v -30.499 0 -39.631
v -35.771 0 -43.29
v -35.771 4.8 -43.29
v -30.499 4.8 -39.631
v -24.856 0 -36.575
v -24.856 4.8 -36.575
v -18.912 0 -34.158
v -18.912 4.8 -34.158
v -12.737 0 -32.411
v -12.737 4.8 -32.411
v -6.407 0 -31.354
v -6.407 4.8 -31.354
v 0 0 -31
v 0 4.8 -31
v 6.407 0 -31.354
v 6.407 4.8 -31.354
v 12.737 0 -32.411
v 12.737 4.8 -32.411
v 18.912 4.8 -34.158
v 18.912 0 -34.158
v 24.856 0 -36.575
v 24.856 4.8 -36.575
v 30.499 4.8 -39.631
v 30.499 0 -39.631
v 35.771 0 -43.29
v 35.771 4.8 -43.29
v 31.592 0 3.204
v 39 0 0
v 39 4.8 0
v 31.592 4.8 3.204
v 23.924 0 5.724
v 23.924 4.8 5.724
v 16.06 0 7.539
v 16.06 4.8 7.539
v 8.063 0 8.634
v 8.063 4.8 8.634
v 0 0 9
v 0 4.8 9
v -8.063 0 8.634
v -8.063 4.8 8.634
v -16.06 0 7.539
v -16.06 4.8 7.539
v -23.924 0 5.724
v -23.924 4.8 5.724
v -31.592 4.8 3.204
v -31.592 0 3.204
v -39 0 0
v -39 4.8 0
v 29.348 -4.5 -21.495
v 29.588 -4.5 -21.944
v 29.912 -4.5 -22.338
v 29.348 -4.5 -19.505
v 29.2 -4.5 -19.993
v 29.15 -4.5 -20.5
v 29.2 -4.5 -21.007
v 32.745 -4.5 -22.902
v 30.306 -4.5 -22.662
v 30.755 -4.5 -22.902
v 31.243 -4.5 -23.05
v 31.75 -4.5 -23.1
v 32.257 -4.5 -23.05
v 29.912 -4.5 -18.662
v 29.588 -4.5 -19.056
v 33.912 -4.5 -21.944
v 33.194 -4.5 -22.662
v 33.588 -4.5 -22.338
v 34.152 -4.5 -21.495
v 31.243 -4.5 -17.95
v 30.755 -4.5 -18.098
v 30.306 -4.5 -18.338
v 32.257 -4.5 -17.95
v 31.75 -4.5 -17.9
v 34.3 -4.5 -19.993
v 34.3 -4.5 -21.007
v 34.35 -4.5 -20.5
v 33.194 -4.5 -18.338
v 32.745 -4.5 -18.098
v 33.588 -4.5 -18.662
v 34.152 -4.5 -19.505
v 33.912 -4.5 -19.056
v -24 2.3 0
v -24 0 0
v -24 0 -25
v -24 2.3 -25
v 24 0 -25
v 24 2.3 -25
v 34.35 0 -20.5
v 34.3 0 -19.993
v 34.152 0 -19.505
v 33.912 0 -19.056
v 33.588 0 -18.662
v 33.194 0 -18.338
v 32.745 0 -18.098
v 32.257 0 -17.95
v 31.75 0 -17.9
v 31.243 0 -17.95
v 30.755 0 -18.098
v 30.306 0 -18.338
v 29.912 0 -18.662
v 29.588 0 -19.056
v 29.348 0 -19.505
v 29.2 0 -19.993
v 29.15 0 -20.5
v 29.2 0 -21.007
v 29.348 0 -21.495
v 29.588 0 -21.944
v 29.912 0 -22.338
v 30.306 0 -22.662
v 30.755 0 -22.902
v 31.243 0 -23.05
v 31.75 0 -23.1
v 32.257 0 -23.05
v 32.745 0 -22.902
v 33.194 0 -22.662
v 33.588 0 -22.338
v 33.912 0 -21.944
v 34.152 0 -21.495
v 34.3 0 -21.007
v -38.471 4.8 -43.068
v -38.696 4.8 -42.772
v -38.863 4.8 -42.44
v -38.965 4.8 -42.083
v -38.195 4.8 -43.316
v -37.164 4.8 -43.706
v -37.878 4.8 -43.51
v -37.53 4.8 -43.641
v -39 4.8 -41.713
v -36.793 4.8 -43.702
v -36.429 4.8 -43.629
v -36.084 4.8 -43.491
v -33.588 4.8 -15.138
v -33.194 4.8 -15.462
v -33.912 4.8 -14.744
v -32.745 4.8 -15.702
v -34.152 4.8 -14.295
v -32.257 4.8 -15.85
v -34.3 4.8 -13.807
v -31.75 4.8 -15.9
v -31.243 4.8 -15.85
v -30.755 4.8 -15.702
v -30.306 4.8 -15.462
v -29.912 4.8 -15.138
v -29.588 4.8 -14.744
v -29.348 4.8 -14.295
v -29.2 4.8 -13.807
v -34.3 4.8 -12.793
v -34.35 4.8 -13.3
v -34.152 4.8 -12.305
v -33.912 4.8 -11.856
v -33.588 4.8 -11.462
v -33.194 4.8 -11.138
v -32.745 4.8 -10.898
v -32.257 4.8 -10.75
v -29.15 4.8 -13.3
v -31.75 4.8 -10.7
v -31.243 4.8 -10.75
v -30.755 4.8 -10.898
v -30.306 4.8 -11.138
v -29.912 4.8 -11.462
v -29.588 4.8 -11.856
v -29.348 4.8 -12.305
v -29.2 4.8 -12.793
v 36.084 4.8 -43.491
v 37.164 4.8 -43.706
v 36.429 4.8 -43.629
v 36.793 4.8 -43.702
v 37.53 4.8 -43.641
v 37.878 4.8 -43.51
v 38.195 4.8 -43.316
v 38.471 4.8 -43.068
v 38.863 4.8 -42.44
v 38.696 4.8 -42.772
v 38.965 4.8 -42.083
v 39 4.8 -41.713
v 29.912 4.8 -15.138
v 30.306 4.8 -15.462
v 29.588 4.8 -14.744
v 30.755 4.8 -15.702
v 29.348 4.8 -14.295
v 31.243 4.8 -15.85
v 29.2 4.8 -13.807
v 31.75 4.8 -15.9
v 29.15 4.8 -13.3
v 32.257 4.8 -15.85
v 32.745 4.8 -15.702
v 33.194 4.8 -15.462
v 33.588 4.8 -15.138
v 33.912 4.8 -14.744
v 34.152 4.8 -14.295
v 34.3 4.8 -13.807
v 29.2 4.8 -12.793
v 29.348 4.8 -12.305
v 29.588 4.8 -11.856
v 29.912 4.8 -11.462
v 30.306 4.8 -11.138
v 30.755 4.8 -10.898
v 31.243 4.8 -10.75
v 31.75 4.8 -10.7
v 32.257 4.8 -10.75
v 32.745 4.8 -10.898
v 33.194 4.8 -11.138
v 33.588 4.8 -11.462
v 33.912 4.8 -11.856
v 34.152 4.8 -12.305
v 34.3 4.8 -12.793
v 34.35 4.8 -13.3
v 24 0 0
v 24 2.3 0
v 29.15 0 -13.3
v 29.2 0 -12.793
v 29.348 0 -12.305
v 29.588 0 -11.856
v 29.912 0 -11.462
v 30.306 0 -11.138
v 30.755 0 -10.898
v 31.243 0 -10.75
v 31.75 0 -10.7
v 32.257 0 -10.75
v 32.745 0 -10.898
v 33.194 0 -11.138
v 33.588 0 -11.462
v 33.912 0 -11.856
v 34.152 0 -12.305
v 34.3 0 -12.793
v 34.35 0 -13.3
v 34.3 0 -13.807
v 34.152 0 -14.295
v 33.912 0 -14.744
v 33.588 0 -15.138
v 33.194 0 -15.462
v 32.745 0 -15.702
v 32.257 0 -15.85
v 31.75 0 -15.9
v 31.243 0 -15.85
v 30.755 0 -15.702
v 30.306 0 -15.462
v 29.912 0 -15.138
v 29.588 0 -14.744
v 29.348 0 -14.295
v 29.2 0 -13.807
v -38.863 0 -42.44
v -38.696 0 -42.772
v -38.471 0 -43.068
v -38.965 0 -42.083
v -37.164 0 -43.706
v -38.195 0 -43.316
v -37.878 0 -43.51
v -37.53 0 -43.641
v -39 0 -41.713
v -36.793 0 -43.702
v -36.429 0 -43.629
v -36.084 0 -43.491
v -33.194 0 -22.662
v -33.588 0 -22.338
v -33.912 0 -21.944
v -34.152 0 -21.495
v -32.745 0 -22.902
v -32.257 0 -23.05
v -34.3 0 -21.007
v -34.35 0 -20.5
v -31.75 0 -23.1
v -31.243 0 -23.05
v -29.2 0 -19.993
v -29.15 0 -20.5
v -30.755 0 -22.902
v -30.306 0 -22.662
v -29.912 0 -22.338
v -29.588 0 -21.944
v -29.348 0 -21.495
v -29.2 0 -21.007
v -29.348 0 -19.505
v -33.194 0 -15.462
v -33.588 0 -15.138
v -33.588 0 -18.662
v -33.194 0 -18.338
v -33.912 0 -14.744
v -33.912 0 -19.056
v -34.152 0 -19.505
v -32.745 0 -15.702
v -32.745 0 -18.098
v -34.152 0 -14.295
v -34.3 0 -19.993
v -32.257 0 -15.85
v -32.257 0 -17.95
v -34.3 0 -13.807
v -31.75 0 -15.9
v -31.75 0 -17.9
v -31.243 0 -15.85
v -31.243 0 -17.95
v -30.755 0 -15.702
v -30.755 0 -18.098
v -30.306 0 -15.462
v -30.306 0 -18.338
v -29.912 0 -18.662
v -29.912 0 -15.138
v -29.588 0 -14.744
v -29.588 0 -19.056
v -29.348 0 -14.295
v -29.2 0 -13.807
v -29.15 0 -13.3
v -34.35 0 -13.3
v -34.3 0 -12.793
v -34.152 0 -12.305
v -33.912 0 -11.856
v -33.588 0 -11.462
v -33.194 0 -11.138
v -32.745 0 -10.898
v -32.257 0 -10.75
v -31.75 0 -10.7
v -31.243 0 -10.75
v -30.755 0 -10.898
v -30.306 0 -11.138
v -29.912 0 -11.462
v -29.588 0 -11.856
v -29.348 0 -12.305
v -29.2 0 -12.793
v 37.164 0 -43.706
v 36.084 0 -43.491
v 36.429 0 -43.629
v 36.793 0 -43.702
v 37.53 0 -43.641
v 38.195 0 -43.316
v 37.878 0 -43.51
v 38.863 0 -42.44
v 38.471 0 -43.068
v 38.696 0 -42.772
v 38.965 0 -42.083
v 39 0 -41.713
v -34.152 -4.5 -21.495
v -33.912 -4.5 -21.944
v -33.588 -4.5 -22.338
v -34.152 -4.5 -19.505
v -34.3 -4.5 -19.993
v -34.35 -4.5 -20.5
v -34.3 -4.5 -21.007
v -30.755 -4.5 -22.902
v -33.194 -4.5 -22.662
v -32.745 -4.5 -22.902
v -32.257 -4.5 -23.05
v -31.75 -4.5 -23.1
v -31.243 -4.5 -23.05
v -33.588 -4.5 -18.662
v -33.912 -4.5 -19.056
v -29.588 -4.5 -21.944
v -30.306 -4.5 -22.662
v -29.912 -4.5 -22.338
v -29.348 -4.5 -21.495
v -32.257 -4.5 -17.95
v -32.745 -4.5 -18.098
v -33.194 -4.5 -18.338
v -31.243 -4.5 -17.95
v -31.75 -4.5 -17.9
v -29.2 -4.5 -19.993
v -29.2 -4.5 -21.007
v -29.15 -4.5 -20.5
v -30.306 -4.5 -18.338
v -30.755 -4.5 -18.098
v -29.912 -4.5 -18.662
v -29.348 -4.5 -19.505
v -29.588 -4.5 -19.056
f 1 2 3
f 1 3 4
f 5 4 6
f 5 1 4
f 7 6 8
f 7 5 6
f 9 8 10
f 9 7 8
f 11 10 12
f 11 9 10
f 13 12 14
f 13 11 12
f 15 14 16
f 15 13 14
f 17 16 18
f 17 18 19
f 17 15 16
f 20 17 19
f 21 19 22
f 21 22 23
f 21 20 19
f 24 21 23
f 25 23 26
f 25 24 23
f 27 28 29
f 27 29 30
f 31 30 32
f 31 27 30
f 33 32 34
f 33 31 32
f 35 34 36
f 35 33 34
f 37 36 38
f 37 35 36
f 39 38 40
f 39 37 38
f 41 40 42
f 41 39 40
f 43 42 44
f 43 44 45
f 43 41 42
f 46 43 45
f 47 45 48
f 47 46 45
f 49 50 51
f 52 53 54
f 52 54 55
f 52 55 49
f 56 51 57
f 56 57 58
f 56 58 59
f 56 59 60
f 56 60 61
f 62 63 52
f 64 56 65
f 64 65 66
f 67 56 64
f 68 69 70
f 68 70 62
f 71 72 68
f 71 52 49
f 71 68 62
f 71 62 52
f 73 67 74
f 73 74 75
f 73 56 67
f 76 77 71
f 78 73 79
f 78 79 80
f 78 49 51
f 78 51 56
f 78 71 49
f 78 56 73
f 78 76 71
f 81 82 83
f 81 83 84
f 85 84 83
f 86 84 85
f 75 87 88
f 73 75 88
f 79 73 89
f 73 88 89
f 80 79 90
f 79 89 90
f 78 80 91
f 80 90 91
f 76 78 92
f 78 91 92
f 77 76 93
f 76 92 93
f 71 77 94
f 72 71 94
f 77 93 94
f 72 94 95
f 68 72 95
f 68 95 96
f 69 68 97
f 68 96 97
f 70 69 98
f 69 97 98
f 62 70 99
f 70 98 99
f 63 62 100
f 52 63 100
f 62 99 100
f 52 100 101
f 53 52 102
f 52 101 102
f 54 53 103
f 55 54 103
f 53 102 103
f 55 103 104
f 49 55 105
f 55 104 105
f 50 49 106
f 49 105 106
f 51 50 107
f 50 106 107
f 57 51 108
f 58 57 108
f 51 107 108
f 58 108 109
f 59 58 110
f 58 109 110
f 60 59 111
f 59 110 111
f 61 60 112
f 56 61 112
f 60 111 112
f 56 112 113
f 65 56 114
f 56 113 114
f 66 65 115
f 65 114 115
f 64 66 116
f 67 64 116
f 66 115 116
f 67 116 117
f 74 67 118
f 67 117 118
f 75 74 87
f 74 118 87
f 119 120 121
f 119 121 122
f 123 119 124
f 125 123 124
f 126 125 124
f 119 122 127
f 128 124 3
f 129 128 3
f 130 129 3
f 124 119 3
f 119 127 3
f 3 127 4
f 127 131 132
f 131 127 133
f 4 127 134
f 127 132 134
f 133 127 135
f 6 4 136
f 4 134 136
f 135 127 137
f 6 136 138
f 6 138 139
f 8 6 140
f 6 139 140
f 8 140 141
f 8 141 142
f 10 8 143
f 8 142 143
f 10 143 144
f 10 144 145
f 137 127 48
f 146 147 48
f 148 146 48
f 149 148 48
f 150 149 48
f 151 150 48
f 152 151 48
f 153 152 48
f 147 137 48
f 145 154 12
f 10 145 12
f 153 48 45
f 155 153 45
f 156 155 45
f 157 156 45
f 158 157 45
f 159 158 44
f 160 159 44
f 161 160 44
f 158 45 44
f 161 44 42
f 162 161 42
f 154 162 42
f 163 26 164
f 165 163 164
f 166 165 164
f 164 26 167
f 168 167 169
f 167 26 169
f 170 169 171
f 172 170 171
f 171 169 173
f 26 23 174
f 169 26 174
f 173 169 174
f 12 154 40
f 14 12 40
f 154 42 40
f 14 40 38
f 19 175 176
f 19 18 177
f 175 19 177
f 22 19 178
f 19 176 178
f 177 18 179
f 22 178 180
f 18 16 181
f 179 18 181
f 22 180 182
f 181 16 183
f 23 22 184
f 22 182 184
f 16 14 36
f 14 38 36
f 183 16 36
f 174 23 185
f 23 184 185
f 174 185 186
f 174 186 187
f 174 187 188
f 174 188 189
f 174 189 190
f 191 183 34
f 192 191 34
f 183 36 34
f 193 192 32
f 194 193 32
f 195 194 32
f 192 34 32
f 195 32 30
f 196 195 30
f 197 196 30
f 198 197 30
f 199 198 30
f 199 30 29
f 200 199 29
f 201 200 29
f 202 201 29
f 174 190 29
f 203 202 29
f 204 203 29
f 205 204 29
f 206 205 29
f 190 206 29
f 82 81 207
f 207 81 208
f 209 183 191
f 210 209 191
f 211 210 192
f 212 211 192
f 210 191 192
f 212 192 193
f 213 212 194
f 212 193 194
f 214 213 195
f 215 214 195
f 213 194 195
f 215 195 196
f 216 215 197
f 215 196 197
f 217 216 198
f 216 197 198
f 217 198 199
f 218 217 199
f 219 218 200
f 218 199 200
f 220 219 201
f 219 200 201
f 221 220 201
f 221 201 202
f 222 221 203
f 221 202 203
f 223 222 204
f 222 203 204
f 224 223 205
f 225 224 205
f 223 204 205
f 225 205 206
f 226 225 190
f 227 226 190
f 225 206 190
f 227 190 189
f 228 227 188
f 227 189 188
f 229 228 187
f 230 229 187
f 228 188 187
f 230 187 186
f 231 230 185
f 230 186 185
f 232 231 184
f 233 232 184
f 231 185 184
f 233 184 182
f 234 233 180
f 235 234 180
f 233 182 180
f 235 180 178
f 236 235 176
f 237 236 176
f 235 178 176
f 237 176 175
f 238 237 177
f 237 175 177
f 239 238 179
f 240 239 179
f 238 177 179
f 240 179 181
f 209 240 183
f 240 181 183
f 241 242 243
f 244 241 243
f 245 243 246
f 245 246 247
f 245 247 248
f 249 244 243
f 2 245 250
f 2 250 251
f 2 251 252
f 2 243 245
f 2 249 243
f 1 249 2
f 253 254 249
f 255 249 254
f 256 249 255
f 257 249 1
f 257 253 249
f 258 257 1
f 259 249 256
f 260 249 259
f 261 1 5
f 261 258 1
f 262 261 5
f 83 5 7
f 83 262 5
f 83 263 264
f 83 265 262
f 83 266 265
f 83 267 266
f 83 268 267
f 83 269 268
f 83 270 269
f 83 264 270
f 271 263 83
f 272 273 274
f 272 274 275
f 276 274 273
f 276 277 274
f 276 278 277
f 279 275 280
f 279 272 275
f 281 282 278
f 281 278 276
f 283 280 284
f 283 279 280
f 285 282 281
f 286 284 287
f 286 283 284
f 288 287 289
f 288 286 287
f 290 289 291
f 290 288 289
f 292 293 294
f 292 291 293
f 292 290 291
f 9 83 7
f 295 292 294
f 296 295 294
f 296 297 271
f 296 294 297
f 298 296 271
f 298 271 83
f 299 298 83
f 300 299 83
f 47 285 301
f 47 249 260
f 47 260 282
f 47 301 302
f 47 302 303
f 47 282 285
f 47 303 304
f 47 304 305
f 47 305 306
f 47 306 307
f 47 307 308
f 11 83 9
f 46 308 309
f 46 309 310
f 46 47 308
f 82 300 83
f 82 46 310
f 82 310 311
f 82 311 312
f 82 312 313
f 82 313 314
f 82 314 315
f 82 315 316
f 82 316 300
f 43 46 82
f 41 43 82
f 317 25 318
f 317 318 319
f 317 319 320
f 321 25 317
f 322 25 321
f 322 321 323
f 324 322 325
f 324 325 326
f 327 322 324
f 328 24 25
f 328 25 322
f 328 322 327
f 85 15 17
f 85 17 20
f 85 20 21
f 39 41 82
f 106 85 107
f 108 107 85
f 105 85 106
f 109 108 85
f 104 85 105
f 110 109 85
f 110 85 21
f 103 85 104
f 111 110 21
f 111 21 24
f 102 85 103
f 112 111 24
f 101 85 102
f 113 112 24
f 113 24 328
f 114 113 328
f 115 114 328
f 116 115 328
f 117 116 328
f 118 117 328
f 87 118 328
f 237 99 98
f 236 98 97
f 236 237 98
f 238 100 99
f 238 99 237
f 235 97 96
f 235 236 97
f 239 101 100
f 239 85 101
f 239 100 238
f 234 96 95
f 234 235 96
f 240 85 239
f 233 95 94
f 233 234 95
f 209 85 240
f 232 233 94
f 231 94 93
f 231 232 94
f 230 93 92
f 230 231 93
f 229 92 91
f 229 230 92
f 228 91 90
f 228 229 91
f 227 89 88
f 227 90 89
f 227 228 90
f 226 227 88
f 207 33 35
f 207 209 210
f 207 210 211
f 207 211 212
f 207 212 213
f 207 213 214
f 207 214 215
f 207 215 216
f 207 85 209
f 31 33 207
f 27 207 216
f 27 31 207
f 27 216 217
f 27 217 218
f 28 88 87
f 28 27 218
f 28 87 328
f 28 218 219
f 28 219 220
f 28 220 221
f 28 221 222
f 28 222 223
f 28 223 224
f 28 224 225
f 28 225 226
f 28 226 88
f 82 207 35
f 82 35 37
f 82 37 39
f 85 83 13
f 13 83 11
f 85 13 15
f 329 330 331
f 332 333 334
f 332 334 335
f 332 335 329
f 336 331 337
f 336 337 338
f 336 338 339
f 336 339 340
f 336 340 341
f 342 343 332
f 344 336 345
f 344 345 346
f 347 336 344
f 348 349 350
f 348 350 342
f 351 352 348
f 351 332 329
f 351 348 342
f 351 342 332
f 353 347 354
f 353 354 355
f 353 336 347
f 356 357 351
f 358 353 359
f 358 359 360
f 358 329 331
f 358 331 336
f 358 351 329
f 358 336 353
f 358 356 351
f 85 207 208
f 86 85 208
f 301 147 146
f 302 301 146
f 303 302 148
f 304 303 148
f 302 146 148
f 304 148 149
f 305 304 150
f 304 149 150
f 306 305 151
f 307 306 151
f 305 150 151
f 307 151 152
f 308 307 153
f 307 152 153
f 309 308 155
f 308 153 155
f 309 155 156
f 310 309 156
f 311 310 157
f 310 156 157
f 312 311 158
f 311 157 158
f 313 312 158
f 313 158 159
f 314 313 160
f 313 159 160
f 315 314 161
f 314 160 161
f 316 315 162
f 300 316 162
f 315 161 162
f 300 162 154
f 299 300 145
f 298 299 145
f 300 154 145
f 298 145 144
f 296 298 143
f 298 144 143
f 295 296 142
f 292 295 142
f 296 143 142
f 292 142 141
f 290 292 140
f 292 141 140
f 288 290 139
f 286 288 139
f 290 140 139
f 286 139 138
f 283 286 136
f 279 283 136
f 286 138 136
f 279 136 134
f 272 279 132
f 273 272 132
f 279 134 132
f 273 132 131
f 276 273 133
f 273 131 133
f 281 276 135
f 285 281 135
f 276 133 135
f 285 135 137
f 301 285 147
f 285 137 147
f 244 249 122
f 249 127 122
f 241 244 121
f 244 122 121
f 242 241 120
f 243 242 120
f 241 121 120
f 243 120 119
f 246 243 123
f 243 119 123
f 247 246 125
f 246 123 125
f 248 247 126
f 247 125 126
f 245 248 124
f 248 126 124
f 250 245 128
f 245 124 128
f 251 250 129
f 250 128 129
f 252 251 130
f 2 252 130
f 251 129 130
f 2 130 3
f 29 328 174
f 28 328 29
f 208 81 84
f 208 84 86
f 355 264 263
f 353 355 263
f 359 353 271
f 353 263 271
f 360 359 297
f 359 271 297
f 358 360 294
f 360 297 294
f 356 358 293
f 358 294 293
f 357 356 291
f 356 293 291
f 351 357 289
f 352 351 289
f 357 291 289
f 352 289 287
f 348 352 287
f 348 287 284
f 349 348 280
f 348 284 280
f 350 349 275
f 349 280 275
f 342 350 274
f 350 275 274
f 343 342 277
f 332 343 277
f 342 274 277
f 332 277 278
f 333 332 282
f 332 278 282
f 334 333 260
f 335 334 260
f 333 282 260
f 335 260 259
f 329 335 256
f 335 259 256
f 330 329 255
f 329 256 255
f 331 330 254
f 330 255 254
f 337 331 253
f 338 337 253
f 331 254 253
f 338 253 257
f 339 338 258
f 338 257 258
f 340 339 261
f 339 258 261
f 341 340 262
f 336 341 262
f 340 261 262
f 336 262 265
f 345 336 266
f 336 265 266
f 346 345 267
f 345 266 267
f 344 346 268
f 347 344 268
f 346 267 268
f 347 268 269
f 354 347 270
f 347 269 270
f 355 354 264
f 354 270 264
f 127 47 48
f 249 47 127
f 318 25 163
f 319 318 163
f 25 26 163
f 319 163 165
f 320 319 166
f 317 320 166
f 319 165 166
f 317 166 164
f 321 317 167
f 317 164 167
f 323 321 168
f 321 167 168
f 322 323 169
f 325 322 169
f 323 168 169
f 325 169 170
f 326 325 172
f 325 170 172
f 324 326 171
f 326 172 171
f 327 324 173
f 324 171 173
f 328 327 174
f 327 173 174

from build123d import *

# Parameters (mm, degrees)
F1_DEPTH = 4.8
F2_R     = 2.6
F3_DEPTH = 4.5
F4_R     = 2.6
F5_DEPTH = 4.8
F6_R     = 2
F7_W     = 48
F7_H     = 2.3
F8_DEPTH = 25


with BuildPart() as f1:
    # F0 (on Front) → F1 (new body)
    with BuildSketch(Plane.XZ):
        with BuildLine():
            Line((-39, 0), (-39, -46))
            ThreePointArc((-39, -46), (0, -31), (39, -46))
            Line((39, -46), (39, 0))
            ThreePointArc((39, 0), (0, 9), (-39, 0))
        make_face()
    extrude(amount=-F1_DEPTH)

    # F2 (on face) → F3 (join)
    with BuildSketch(Plane.XZ):
        with Locations((-31.75, -20.5)):
            Circle(F2_R)
        with Locations((31.75, -20.5)):
            Circle(F2_R)
    extrude(amount=F3_DEPTH)

    # F4 (on face) → F5 (cut, through all)
    with BuildSketch(Plane(origin=(0, 4.8, 0), x_dir=(-1, 0, 0), z_dir=(0, 1, 0))):
        with Locations((-31.75, -13.3)):
            Circle(F4_R)
        with Locations((31.75, -13.3)):
            Circle(F4_R)
    extrude(amount=-F5_DEPTH, mode=Mode.SUBTRACT)

    # F6
    f6_edges = [f1.edges().sort_by_distance(p)[0] for p in [
        (-39, 2.4, -46),
        (39, 2.4, -46),
    ]]
    fillet(f6_edges, radius=F6_R)

    # F7 (on Top) → F8 (cut)
    with BuildSketch(Plane.XY):
        with Locations((0, 1.15)):
            Rectangle(F7_W, F7_H)
    extrude(amount=-F8_DEPTH, mode=Mode.SUBTRACT)


solid = f1.part
